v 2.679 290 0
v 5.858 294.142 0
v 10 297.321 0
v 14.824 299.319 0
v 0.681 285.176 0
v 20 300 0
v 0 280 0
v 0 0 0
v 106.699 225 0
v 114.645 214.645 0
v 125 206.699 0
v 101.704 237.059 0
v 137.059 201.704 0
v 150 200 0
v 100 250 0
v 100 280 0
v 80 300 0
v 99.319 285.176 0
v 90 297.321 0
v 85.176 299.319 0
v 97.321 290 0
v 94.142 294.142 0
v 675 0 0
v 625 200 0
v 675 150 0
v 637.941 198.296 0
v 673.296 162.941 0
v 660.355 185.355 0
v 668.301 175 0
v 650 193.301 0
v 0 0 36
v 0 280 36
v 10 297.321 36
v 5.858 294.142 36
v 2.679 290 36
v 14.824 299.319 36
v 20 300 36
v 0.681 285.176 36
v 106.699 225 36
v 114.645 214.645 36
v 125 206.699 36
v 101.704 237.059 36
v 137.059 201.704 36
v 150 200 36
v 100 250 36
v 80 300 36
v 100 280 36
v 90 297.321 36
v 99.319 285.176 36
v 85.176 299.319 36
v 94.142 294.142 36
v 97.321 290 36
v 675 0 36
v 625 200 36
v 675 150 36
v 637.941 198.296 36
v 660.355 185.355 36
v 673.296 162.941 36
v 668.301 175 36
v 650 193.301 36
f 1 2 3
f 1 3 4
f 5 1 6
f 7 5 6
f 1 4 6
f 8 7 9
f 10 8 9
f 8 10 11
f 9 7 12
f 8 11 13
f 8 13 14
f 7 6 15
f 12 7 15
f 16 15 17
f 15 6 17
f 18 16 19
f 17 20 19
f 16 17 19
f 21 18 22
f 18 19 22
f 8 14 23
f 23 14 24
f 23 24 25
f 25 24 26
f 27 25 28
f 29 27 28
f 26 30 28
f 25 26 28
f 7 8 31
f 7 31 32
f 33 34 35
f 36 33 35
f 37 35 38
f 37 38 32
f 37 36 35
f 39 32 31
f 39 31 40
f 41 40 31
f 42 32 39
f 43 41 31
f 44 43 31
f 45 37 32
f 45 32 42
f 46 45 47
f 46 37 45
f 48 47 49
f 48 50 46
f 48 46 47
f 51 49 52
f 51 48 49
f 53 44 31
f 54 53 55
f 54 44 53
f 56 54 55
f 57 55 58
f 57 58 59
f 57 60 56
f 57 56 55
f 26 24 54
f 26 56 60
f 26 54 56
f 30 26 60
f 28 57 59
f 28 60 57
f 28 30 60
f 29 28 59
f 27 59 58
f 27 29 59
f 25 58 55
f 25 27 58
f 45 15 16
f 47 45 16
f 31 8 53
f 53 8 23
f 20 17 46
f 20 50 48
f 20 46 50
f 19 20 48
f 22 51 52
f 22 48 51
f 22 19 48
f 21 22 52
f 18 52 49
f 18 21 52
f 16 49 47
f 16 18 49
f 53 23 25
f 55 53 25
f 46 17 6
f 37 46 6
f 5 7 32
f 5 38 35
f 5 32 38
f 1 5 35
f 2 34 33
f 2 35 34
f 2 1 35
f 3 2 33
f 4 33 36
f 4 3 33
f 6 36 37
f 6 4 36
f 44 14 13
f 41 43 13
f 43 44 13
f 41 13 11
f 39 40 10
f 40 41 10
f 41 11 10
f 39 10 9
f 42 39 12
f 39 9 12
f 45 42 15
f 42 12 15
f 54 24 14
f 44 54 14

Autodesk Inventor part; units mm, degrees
ref_plane "YZ Plane" through (0, 0, 0) normal (1, 0, 0) x (0, 1, 0)
ref_plane "XZ Plane" through (0, 0, 0) normal (0, 1, 0) x (-1, 0, 0)
ref_plane "XY Plane" through (0, 0, 0) normal (0, 0, 1) x (1, 0, 0)
ref_plane "Work Plane1" through (0, 0, 0) normal (0, 0, 1) x (1, 0, 0)
sketch "Sketch1" plane through (0, 0, 0) normal (0, 0, 1) x (1, 0, 0)
  line L0 (0, 0) -> (675, 0) projected
  line L1 (675, 0) -> (675, 150) projected
  line L2 (100, 150) -> (675, 150) projected
  line L3 (100, 150) -> (100, 850) projected
  line L4 (0, 850) -> (100, 850) projected
  line L5 (0, 0) -> (0, 850) projected
  line L6 (0, 0) -> (100, 0)
  line L7 (80, 300) -> (20, 300)
  line L8 (0, 280) -> (0, 0)
  line L9 (100, 0) -> (675, 0)
  line L10 (675, 0) -> (675, 150)
  line L11 (625, 200) -> (150, 200)
  line L12 (100, 200) -> (100, 0)
  line L13 (100, 0) -> (100, 150)
  line L14 (100, 250) -> (100, 280)
  arc A0 (100, 280) -> (80, 300) centre (80, 280) ccw
  arc A1 (20, 300) -> (0, 280) centre (20, 280) ccw
  arc A2 (675, 150) -> (625, 200) centre (625, 150) ccw
  arc A3 (100, 250) -> (150, 200) centre (150, 250) ccw
  point P0 (100, 300)
  point P1 (0, 300)
  point P2 (675, 200)
  dimension "d0" = 150
  dimension "d1" = 200
  dimension "d2" = 300
  dimension "d3" = 20
  dimension "d4" = 20
  dimension "d5" = 50
extrude "Extrusion1" add sketch "Sketch1" along normal blind 36 contours L5 A1 L7 A0 L3 L12 L0 | L12 L2 L1 L0 | L3 A3 L11 A2 L2
properties part number "bracera"
